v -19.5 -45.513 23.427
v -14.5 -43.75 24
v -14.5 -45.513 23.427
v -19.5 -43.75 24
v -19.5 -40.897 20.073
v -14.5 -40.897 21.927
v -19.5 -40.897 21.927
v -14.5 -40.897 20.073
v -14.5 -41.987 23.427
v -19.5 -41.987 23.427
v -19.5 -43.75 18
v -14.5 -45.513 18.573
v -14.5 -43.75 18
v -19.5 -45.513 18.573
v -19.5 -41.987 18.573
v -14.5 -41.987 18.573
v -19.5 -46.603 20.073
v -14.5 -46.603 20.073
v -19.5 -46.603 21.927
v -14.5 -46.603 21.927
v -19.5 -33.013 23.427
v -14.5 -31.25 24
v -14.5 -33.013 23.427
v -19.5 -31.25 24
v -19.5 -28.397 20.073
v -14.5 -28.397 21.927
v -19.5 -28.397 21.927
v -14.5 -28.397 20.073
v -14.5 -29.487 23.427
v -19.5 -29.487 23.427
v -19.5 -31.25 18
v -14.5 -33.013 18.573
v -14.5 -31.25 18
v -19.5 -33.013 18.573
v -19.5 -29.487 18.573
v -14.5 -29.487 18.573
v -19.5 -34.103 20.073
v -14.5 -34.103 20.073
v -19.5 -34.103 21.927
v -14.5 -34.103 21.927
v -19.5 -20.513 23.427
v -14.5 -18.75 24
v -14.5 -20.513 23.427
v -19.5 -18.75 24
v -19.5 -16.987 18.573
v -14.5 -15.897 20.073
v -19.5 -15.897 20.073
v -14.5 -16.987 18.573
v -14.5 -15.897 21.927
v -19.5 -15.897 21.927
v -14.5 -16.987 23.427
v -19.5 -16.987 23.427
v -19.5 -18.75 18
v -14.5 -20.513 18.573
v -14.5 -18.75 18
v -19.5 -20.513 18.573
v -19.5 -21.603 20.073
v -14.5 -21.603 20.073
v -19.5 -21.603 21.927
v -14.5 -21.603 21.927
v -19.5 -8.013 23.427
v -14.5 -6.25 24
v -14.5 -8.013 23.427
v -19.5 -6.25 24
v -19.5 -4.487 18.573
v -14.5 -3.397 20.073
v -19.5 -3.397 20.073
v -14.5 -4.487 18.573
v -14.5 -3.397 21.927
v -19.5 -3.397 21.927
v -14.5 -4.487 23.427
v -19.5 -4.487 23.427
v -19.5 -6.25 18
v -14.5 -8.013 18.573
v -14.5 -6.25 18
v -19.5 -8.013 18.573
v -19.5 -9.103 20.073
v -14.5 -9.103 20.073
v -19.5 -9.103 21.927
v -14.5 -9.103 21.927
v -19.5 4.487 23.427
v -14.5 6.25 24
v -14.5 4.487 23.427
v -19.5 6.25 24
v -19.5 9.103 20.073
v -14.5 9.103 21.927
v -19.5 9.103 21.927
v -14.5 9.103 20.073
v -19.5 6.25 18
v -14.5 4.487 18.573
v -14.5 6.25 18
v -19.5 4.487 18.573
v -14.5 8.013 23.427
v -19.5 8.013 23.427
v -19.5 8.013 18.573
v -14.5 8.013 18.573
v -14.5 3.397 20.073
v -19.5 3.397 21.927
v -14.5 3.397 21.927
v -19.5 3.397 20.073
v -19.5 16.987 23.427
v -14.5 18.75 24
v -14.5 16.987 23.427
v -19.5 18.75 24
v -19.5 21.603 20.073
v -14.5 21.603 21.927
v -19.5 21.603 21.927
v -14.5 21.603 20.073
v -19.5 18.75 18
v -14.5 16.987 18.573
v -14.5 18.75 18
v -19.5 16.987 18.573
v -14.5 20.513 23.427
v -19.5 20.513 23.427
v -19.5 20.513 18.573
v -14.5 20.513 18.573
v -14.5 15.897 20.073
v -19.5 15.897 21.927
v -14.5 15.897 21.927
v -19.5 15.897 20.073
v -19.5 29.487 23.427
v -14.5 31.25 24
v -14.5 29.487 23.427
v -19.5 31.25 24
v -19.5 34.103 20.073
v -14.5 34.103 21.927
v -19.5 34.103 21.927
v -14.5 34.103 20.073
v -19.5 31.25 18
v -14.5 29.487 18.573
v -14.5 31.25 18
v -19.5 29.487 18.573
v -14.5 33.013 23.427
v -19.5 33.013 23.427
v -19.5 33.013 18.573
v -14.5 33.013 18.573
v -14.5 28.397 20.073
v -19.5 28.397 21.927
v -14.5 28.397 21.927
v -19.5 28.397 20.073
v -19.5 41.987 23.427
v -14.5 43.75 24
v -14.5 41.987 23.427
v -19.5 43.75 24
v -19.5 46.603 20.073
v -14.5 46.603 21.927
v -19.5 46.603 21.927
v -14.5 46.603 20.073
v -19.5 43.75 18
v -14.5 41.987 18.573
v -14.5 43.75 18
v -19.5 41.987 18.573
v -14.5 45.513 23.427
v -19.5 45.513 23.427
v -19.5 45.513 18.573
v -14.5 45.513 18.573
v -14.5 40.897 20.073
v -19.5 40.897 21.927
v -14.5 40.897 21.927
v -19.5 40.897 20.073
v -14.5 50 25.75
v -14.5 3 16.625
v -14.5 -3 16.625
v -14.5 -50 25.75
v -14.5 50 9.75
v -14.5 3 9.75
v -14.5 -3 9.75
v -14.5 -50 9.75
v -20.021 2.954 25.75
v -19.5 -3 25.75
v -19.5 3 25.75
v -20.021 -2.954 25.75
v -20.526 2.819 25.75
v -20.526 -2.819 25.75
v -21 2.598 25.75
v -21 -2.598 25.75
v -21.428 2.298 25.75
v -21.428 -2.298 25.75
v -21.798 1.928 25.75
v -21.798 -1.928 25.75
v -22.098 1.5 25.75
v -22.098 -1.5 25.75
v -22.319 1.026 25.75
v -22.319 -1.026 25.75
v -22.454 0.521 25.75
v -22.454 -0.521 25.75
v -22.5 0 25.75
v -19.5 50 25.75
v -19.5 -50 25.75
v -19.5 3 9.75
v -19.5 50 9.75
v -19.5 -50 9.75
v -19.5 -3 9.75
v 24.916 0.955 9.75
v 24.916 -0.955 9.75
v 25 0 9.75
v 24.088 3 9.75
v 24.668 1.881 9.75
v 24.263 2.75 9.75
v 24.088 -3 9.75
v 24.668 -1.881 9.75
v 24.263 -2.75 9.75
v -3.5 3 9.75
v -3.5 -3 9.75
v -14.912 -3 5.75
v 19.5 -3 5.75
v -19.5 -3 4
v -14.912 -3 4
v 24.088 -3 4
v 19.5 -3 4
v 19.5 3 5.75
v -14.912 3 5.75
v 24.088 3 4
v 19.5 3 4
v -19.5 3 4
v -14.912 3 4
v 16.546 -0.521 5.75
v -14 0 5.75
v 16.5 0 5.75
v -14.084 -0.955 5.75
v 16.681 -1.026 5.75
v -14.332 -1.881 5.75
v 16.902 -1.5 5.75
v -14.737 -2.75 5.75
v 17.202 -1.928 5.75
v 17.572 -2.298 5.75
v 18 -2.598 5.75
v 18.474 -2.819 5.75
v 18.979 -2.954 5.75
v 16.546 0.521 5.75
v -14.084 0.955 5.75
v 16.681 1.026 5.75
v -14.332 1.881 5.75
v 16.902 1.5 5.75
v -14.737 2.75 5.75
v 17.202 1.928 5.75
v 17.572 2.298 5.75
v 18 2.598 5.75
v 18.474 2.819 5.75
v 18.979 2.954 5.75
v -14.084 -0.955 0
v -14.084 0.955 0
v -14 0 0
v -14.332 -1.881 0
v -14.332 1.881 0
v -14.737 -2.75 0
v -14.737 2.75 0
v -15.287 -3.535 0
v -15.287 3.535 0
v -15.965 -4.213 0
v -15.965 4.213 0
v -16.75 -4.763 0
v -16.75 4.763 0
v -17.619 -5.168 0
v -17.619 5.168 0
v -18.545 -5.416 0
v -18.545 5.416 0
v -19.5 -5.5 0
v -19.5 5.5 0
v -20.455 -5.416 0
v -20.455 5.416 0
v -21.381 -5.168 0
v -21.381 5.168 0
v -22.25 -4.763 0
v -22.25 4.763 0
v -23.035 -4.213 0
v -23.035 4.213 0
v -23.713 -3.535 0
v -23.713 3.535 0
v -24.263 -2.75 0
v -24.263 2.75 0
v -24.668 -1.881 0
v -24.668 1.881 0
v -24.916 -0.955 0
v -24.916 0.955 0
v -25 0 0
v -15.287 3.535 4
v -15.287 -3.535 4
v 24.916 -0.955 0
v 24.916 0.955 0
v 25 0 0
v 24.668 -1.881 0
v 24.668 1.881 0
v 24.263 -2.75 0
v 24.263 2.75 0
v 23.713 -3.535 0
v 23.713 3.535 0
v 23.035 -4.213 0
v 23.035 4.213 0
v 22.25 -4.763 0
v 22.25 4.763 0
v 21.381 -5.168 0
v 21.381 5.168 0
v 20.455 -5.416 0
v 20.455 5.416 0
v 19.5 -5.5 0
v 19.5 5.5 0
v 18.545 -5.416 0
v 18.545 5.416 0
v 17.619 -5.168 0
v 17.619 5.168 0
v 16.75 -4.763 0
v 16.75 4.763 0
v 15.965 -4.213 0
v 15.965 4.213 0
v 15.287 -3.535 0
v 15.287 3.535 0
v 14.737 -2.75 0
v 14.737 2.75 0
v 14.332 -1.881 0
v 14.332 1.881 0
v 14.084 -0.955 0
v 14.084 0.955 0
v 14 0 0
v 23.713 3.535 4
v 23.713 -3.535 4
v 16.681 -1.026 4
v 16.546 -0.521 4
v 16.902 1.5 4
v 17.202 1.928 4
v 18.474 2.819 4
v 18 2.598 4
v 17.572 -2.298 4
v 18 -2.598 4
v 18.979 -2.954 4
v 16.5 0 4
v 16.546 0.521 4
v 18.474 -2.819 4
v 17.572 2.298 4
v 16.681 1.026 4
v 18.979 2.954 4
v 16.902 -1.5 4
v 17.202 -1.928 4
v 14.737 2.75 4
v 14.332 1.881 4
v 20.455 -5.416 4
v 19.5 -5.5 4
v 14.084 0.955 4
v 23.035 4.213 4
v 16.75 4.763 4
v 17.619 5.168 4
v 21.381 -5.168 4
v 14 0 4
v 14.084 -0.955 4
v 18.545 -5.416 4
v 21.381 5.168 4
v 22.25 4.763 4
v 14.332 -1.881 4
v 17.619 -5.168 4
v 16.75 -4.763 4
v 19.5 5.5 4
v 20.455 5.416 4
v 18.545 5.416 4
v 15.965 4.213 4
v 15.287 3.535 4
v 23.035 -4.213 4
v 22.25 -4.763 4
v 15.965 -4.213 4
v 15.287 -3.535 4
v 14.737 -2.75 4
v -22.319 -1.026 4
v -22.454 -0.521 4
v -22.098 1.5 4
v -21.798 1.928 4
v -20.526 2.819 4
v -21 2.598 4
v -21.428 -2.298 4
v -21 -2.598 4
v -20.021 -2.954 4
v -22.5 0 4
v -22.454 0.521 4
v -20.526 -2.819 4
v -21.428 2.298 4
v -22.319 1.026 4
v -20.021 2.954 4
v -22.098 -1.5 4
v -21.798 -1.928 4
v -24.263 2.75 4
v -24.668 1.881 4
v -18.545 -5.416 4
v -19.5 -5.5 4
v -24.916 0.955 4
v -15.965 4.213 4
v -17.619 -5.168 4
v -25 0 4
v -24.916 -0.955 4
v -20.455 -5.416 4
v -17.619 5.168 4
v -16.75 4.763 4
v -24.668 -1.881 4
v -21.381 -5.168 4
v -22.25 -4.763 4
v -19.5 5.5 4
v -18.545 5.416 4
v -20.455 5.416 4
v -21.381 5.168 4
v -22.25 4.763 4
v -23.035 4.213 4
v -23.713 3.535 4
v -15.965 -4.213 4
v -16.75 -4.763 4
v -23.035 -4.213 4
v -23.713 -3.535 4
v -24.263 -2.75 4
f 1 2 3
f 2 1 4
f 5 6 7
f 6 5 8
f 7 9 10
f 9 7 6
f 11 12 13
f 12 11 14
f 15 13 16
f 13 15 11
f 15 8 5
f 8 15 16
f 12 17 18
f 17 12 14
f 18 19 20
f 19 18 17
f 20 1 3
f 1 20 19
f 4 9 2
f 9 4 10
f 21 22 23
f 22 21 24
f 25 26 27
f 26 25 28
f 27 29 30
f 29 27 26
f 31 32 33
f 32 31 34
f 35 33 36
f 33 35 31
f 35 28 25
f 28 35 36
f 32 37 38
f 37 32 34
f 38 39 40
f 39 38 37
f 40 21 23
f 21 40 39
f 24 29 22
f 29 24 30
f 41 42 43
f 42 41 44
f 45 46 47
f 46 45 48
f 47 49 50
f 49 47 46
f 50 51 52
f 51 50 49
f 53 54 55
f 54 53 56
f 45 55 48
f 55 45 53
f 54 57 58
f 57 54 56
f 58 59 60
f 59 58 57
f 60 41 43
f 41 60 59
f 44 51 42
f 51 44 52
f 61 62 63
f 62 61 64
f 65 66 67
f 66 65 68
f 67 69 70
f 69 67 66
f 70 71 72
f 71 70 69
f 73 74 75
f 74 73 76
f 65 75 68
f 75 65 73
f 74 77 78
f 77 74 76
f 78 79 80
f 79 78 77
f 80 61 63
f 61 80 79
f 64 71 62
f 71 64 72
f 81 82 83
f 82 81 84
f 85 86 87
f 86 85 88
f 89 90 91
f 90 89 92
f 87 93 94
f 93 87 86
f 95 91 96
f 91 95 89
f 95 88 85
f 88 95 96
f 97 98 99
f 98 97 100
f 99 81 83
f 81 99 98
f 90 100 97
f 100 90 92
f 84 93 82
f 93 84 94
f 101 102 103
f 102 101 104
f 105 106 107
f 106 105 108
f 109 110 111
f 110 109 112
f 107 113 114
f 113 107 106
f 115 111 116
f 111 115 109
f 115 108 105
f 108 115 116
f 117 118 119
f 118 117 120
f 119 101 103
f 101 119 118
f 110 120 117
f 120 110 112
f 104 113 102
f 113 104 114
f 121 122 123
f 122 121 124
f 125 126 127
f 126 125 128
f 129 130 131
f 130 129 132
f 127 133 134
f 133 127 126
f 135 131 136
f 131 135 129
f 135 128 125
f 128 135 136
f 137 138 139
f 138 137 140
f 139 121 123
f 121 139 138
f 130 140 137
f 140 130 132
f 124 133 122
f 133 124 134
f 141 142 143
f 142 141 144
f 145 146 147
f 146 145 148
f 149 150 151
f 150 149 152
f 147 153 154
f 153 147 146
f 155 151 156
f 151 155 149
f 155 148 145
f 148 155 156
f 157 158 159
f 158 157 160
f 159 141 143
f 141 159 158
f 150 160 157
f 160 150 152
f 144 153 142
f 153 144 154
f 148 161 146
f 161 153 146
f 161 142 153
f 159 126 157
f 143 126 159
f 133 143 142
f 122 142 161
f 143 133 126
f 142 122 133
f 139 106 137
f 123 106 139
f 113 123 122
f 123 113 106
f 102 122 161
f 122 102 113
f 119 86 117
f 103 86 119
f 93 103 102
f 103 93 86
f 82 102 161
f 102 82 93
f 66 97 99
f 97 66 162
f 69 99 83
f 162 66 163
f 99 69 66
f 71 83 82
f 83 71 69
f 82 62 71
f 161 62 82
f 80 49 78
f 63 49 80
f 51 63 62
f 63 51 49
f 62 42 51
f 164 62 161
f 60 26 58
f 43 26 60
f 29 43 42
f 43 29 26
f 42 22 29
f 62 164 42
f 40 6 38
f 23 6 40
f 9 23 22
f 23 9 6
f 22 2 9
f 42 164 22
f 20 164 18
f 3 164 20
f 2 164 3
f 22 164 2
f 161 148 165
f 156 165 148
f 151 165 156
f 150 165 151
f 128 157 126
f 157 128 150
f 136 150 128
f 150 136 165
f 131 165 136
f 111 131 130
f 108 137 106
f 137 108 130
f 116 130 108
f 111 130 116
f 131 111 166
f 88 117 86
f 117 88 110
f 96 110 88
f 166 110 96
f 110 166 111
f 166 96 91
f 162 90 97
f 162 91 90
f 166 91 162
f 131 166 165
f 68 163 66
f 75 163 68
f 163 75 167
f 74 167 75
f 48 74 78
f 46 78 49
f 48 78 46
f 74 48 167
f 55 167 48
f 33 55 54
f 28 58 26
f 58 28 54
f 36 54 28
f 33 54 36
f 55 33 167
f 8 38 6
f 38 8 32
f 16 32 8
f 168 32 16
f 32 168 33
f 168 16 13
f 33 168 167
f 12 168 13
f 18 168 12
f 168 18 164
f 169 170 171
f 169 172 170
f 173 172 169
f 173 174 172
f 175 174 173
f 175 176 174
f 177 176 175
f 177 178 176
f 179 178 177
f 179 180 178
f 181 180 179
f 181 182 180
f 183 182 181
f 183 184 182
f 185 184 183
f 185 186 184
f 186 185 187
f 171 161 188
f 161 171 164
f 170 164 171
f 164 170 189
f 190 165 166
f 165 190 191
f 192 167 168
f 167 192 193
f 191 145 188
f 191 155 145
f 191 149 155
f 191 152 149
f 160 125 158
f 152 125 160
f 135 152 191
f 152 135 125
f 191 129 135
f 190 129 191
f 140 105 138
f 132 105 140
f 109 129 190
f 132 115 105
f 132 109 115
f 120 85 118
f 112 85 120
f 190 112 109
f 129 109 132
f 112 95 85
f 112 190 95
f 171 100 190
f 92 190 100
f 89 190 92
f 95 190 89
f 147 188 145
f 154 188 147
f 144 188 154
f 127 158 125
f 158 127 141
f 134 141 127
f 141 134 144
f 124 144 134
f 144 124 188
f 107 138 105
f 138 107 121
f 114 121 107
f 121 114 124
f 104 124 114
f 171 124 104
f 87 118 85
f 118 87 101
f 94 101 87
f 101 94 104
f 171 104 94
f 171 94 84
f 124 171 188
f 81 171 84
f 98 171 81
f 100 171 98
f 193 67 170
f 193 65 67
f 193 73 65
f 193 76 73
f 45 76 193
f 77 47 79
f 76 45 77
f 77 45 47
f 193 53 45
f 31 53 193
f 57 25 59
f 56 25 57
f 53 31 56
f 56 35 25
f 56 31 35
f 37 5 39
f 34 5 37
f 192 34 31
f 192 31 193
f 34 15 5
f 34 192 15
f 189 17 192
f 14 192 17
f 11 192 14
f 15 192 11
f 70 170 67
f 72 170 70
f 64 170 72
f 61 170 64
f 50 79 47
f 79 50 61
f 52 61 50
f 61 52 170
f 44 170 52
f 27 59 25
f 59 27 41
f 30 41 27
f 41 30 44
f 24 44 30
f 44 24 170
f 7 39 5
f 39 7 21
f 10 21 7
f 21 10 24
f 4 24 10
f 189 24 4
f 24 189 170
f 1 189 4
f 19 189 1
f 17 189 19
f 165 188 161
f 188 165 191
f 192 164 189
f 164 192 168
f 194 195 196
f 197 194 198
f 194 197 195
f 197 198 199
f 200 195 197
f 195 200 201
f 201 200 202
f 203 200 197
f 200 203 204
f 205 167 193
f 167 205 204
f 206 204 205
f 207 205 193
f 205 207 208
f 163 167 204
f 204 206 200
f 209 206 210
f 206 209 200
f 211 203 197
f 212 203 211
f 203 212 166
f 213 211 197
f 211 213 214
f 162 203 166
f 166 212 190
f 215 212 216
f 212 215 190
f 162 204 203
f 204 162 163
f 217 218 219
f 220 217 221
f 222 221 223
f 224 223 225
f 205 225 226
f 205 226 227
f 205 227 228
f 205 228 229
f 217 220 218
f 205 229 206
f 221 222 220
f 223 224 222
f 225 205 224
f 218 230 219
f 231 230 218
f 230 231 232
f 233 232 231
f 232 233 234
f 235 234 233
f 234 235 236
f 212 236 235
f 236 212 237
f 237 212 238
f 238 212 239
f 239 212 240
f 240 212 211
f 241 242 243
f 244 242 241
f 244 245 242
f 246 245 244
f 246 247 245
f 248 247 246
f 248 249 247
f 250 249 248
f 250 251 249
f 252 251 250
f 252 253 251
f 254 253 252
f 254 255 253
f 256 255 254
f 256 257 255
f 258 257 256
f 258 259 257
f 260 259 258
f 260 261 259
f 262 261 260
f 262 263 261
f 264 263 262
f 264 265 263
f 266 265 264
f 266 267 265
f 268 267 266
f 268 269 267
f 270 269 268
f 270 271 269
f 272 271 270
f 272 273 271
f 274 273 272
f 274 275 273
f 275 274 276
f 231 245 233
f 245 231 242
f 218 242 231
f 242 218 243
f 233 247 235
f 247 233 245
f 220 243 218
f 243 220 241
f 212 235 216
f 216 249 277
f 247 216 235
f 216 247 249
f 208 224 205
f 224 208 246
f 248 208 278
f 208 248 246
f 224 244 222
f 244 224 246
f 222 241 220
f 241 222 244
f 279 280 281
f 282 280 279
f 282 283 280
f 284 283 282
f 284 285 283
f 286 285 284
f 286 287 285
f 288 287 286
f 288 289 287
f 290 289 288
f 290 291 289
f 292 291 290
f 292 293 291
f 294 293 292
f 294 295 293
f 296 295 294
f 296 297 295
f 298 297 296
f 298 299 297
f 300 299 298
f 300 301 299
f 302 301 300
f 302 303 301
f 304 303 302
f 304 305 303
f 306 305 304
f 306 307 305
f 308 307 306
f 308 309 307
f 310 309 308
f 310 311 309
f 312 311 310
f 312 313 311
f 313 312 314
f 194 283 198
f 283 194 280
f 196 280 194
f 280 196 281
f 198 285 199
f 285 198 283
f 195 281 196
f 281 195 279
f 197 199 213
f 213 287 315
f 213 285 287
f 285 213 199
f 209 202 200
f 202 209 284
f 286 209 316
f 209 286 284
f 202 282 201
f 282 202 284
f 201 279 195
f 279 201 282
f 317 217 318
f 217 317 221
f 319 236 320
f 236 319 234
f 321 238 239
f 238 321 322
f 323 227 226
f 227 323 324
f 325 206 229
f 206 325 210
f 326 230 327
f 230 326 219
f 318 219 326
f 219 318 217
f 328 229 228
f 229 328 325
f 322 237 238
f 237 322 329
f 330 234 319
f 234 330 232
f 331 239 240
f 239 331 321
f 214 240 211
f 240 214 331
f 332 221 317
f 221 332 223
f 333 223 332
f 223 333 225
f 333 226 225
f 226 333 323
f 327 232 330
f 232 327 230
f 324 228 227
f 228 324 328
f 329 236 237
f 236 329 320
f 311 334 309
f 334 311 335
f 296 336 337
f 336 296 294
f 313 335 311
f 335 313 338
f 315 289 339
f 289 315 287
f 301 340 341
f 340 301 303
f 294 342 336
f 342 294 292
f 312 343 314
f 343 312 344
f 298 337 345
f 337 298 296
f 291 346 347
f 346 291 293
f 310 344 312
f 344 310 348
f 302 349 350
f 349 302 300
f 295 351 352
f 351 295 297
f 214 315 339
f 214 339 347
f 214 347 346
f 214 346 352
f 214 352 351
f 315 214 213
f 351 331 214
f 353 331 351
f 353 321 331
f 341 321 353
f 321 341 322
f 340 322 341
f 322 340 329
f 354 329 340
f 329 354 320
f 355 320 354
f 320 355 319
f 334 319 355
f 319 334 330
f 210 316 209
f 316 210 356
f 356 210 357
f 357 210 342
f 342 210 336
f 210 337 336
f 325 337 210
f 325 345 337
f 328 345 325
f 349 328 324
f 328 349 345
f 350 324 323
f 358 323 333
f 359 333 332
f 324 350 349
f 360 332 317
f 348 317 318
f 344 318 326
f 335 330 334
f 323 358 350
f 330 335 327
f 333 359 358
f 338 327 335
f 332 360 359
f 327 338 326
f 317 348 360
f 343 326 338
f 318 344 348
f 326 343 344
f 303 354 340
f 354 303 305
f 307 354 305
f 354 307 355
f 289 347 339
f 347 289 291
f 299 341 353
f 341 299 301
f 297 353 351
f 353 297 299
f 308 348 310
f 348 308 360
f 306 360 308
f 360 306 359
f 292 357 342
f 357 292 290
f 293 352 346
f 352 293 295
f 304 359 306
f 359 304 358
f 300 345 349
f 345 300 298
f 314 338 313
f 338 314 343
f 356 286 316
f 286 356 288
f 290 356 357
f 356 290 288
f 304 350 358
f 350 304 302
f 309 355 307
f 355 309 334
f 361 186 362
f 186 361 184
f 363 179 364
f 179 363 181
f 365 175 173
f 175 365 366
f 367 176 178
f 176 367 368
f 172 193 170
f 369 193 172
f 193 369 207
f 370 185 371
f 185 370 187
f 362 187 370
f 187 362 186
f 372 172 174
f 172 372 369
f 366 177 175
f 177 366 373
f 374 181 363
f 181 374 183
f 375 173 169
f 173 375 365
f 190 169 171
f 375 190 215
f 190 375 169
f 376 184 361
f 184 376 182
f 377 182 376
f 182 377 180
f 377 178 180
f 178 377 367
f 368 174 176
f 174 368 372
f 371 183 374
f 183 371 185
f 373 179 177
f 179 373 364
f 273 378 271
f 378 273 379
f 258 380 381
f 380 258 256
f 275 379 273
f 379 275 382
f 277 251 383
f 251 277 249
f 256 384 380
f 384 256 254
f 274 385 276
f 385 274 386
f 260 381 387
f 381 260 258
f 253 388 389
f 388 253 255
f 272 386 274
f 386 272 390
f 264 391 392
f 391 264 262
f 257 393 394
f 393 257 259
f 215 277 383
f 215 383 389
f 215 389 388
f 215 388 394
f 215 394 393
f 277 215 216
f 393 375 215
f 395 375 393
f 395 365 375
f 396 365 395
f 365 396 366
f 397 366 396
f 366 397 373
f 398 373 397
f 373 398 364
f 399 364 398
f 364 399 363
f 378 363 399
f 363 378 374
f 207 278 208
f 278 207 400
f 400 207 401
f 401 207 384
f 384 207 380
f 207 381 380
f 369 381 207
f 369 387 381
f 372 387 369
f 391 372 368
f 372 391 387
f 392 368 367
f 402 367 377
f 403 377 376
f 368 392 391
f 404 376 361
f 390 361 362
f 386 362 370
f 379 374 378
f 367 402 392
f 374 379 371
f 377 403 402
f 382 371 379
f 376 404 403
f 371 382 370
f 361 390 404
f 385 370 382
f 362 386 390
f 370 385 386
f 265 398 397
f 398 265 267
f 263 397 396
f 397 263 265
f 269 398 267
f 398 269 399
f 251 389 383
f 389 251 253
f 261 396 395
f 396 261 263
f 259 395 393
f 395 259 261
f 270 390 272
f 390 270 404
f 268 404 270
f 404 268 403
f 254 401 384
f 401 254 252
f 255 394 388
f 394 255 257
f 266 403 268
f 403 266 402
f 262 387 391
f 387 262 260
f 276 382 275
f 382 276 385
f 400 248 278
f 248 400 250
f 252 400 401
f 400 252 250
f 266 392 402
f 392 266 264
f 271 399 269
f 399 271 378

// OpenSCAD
//width of the shelf
shelf_width = 100;
//radius of the holes
shelf_hole_radius = 3;
//number of holes
num_holes = 8;


//diameter of the large round part of the key hole,make smaller then real (for clearaces)
key_big = 11;
//diameter of the small offshoot from the main key cylinder,make smaller then real (for clearaces)
key_small = 6;

//distance from one key hole to the same point in the next key hole, make slightly bigger then real (for clearaces)
key_spacing = 39;
//thickness of the material the key holes are kut out of, make slightly bigger then real (for clearaces)
key_thickness = 1.75;

//total hight if hook tip, hook width will = half this, hook should be smaller then poke
hook = 10;
//thickness of lugs and support bar
support_thickness = 4;


//calculated
spacer = ((shelf_width - (shelf_hole_radius * 2 * num_holes)) / num_holes) / 2;
poke = (shelf_hole_radius*2)+hook;
hookStart = support_thickness*2+key_thickness;
angle = atan ( hook / poke);
hype = poke + hook;
KBR = key_big/2;
KSR = key_small/2;

module wedge()  {
	translate([0,-key_small,0]) difference() {
		cube([poke,key_small,hook]);
		rotate(a=[0,-angle,0])translate([0,-1,0])cube([hype,key_small+2,hook]);
	}
}

module betterjoints() {
	intersection(){
		translate([0,-KSR,0])cube([key_spacing,key_small,support_thickness*2+key_thickness]);
		cylinder(h= support_thickness*2+key_thickness ,r1 = KBR , r2 = KBR,$fn=36);
	}
}

translate([-KBR- key_spacing/2,-KBR,0]) {		//to centre item on the build platform

  difference() {
    //shelf
    translate([KBR, KBR - (shelf_width/2), hookStart]) {
	    cube([hook/2, shelf_width, poke]);
    }

    //holes
    for ( i = [1 : num_holes ] ) {
      translate([
	      (KBR/2)-(hook/2), 
	      KBR - (shelf_width/2) + (shelf_hole_radius + spacer)*(i *2-1), 
	      hype-(poke/2)+(key_small/2)]) {
	
	      rotate([0, 90, 0]) {
		      #cylinder(h = hook*2, r = shelf_hole_radius);
	      }
      }  
    }
  }


  translate([KBR,KBR - KSR,hookStart]) {		//support bar making and wedge
    translate([poke,0,0])rotate(a=[0,0,180]) wedge();
    translate([0,0,-support_thickness]) cube([key_spacing,key_small,support_thickness]);
  }

  translate([KBR,KBR,0]) {								//post 1
	  cylinder(h= hookStart + poke, r1 = KSR ,r2 = KSR,$fn=36);
	  cylinder(h= support_thickness ,r1 = KBR , r2 = KBR,$fn=36);
	  betterjoints();
	  translate([key_spacing,0,0]){						//post 2
		  cylinder(h= hookStart, r1 = KSR ,r2 = KSR,$fn=36);
		  cylinder(h= support_thickness ,r1 = KBR , r2 = KBR,$fn=36);
		  betterjoints();
		  }
	  }
}
